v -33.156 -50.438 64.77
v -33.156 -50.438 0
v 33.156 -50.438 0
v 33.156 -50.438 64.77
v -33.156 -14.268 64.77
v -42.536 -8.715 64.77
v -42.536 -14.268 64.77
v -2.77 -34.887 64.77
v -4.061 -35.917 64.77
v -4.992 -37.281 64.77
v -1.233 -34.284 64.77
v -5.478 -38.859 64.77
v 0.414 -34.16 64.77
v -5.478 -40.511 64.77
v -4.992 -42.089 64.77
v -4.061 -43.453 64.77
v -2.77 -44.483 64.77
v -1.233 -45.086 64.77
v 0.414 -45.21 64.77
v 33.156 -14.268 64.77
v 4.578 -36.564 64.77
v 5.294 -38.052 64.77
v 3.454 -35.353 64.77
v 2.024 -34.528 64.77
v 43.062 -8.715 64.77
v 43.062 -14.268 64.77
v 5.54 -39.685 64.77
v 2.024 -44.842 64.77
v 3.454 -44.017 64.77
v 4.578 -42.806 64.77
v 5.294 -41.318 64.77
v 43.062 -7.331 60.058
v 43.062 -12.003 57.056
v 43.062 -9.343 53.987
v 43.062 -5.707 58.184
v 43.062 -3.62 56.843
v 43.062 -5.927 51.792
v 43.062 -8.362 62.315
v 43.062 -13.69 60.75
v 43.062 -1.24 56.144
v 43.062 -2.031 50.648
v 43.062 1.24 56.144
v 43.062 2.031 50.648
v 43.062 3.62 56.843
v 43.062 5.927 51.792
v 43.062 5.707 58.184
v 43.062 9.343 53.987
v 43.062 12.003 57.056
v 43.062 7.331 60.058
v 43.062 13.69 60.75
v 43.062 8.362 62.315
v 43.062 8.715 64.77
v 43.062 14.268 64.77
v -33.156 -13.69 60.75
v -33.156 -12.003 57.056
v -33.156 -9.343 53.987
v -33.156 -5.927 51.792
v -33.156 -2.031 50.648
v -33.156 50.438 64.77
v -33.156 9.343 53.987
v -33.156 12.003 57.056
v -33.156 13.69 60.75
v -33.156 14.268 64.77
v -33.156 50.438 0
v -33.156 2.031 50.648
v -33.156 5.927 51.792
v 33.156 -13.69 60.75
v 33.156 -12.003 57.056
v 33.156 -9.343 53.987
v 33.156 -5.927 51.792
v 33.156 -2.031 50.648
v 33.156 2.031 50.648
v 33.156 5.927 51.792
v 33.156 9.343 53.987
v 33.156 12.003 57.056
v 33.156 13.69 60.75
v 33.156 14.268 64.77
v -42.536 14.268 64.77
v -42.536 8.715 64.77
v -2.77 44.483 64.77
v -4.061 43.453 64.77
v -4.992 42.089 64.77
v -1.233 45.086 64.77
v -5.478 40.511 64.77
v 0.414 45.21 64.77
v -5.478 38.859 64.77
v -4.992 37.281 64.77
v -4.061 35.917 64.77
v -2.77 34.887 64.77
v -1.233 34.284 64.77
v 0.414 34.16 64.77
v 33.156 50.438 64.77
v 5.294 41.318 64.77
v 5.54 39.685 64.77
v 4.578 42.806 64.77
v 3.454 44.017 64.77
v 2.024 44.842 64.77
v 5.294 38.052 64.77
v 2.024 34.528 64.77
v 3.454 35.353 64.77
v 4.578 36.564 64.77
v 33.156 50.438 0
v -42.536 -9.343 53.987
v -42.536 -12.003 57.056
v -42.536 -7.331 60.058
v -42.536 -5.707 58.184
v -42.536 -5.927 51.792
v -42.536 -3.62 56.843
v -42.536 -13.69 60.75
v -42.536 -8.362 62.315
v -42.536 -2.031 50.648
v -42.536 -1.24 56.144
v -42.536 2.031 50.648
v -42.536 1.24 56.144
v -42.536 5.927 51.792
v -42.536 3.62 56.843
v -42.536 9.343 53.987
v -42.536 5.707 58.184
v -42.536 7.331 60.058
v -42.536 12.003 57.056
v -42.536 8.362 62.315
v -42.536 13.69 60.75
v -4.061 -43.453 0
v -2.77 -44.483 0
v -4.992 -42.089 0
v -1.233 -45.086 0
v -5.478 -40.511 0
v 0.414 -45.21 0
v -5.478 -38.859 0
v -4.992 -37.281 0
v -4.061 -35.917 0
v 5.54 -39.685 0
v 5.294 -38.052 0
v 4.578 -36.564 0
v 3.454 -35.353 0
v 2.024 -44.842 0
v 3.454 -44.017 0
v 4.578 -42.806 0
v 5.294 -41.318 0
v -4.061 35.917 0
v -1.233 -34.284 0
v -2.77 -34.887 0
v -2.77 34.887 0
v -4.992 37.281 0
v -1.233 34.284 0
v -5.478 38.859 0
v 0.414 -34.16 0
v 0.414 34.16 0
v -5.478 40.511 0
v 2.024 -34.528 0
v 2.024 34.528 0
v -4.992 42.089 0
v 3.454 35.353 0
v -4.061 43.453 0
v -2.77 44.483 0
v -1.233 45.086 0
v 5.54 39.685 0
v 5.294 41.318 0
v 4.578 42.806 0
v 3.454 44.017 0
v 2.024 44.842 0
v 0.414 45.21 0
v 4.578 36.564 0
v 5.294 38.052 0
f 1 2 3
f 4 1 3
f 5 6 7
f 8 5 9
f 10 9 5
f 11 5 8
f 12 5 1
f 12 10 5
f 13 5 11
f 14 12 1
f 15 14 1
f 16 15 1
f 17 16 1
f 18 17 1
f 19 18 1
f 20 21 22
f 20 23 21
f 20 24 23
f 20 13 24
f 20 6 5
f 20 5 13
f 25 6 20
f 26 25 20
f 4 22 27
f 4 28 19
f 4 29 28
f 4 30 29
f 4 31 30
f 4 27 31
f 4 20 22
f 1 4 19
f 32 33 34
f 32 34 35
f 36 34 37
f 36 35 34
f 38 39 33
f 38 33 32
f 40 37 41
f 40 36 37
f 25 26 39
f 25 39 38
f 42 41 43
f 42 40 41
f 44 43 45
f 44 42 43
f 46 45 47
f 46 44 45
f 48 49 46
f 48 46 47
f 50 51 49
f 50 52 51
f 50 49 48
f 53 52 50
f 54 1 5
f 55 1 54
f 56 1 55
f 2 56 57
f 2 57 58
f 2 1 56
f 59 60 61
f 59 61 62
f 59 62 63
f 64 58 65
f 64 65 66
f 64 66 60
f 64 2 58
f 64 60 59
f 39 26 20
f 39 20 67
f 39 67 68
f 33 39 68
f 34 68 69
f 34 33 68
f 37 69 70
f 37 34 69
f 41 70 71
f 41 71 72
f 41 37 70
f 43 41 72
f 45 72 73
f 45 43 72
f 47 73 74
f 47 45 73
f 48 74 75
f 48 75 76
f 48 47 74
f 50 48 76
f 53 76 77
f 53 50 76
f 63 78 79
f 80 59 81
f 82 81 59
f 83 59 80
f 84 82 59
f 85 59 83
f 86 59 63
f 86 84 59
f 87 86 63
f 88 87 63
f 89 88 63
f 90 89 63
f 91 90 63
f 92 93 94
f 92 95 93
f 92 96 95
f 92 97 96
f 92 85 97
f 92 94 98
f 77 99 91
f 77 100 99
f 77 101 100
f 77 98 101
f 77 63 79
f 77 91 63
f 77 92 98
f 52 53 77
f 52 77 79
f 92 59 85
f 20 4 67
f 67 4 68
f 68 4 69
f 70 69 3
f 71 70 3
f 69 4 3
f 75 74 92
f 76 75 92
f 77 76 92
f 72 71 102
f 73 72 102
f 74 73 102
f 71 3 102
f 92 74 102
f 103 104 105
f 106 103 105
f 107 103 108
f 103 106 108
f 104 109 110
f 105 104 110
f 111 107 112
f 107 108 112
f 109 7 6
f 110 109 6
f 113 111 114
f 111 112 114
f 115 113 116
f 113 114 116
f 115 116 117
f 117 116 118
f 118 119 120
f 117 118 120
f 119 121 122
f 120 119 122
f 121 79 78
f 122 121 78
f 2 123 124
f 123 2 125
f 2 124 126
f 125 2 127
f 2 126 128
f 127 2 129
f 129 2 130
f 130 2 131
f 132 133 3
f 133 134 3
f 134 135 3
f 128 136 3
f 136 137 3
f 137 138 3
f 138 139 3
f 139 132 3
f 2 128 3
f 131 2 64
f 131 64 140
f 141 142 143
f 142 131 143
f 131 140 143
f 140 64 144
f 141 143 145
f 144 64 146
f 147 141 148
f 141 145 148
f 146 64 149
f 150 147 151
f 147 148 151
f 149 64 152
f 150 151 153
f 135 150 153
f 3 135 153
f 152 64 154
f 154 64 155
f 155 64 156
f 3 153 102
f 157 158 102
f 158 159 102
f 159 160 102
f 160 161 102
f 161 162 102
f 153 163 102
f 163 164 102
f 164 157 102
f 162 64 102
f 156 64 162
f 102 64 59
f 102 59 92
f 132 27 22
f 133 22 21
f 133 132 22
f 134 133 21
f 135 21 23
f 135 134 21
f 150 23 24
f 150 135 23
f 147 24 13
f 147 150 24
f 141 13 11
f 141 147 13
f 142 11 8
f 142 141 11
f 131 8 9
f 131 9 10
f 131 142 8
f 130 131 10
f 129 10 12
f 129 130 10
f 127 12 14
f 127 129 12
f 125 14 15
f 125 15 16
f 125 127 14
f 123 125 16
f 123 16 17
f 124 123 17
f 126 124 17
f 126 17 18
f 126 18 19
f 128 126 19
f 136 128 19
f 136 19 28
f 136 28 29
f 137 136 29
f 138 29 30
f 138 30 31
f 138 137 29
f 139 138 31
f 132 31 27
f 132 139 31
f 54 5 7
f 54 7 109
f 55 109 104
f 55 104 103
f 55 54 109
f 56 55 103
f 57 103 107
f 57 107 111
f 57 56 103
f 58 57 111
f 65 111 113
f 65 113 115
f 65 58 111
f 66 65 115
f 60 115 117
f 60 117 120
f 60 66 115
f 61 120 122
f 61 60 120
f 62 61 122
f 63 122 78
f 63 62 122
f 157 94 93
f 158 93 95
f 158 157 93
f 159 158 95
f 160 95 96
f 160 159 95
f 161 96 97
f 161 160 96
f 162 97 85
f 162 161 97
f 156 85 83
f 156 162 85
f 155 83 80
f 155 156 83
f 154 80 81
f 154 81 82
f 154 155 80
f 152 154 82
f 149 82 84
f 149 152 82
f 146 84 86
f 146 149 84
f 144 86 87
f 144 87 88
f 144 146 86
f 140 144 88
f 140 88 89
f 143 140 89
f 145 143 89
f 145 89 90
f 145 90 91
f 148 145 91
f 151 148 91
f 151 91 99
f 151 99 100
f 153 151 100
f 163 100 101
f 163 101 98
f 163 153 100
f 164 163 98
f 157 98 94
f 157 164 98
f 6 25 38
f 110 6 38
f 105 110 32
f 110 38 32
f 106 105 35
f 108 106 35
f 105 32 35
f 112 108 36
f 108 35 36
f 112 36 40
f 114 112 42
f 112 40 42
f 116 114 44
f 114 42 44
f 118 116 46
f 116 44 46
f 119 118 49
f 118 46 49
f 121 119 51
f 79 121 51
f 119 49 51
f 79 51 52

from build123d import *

# Parameters (mm, degrees)
F0_W     = 66.3122907281
F0_H     = 100.8766070008
F0_R     = 5.5402980892
F1_DEPTH = 64.77
F3_DEPTH = 75.692
F5_DEPTH = 65.786
F7_DEPTH = 101.6


with BuildPart() as f1:
    # F0 (on Top) → F1 (new body)
    with BuildSketch(Plane.XY):
        Rectangle(F0_W, F0_H)
        with Locations((0, -39.684958756)):
            Circle(F0_R, mode=Mode.SUBTRACT)
        with Locations((0, 39.684958756)):
            Circle(F0_R, mode=Mode.SUBTRACT)
    extrude(amount=F1_DEPTH)

    # F2 (on face) → F3 (join, symmetric)
    with BuildSketch(Plane.YZ.offset(33.156145364)):
        with BuildLine():
            Line((8.4750251617, 64.77), (-8.4750251617, 64.77))
            ThreePointArc((-8.4750251617, 64.77), (0, 56.2949748383), (8.4750251617, 64.77))
        make_face()
        with BuildLine():
            ThreePointArc((8.4750251617, 64.77), (0, 56.2949748383), (-8.4750251617, 64.77))
            Line((-8.4750251617, 64.77), (-14.2677179965, 64.77))
            ThreePointArc((-14.2677179965, 64.77), (0, 50.5022820035), (14.2677179965, 64.77))
            Line((14.2677179965, 64.77), (8.4750251617, 64.77))
        make_face()
    extrude(amount=F3_DEPTH, both=True)

    # F4 (on face) → F5 (cut)
    with BuildSketch(Plane.YZ.offset(108.848145364)):
        with BuildLine():
            Line((14.2677179965, 64.77), (-14.2677179965, 64.77))
            ThreePointArc((-14.2677179965, 64.77), (0, 50.5022820035), (14.2677179965, 64.77))
        make_face()
    extrude(amount=-F5_DEPTH, mode=Mode.SUBTRACT)

    # F6 (on face) → F7 (cut)
    with BuildSketch(Plane.YZ.offset(43.062145364)):
        with BuildLine():
            Line((8.7146712467, 64.77), (-8.7146712467, 64.77))
            ThreePointArc((-8.7146712467, 64.77), (0, 56.0553287533), (8.7146712467, 64.77))
        make_face()
    extrude(amount=-F7_DEPTH, mode=Mode.SUBTRACT)


solid = f1.part
